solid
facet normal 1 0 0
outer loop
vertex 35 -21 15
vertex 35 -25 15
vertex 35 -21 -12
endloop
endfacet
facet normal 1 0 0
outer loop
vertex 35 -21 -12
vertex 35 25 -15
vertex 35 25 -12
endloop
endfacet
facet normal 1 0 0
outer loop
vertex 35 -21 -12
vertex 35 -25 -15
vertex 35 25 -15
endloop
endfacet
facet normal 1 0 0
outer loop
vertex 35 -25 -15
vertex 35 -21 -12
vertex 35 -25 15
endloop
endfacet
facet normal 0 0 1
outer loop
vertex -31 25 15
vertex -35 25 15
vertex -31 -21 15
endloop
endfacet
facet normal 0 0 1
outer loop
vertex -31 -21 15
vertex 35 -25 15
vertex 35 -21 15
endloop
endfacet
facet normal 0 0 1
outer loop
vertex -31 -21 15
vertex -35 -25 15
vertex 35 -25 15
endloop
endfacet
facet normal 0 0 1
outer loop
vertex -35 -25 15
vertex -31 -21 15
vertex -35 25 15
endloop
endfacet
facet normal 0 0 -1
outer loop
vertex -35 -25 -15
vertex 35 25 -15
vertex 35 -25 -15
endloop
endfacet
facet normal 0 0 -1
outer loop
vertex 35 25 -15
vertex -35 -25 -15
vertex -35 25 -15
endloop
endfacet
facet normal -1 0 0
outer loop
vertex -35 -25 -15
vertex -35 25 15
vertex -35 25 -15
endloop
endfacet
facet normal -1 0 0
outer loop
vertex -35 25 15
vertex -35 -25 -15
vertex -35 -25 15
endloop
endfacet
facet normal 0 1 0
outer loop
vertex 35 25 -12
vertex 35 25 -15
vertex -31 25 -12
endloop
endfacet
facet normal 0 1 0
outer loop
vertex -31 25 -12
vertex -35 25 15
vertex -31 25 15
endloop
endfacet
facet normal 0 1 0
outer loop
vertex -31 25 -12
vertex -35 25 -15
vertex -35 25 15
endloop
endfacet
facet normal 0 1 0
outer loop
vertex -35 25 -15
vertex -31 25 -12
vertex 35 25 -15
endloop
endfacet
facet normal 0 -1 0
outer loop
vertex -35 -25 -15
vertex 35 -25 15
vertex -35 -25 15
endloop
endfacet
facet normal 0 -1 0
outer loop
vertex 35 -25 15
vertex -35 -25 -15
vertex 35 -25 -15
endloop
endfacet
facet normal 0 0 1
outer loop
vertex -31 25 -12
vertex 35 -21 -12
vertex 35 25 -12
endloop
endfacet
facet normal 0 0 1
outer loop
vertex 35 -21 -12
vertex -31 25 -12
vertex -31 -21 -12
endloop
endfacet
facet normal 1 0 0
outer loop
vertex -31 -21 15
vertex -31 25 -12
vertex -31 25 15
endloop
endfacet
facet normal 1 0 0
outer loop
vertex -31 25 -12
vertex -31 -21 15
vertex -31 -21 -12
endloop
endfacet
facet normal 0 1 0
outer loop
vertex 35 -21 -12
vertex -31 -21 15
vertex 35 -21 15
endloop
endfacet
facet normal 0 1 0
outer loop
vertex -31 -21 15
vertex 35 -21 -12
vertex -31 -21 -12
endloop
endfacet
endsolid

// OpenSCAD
$fn = 128; // High resolution for smooth curves and precise fits

// --- Part 1: Box Dimensions ---
// Outer dimensions (X x Y x Z)
BOX_OUT_X = 70;
BOX_OUT_Y = 50;
BOX_OUT_Z = 30;

// Wall and floor thickness
WALL_THICKNESS = 2;
FLOOR_THICKNESS = 2;

// --- Part 2: Lid Dimensions ---
// Plate dimensions (same as box outer footprint)
LID_PLATE_X = 70;
LID_PLATE_Y = 50;
LID_PLATE_Z = 2; // Thickness of the base plate

// Lip dimensions
LIP_WALL_THICKNESS = 1.5;
LIP_HEIGHT = 4; // Height of the lip above the plate

// Lip outer size (calculated to provide 0.2mm clearance inside the 70x50 box)
// Box inner width = 70 - 2*2 = 66. Target clearance = 0.2. Lip width = 66 - 2*0.2 = 65.6
// Box inner depth = 50 - 2*2 = 46. Target clearance = 0.2. Lip depth = 46 - 2*0.2 = 45.6
LIP_OUT_X = 65.6;
LIP_OUT_Y = 45.6;

// --- Assembly Positioning ---
// Gap between parts
GAP = 10;

// Positioning variables
// Box is centred at X=0, Y=0
// Lid is placed on the +X side with a 10mm gap
// Lid X position = (Box X / 2) + GAP + (Lid X / 2)
// Lid Y position = 0 (centred)
LID_X_OFFSET = (BOX_OUT_X / 2) + GAP + (LID_PLATE_X / 2);

module box() {
    // Create the box shell
    // We use a single difference to create the hollow box
    difference() {
        // Outer block
        translate([0, 0, 0])
            cube([BOX_OUT_X, BOX_OUT_Y, BOX_OUT_Z], center = true);
        
        // Inner void (negative space)
        // Inner dimensions:
        // X: 70 - 2*2 = 66
        // Y: 50 - 2*2 = 46
        // Z: 30 - 2 (floor) = 28
        translate([WALL_THICKNESS, WALL_THICKNESS, FLOOR_THICKNESS])
            cube([
                BOX_OUT_X - 2*WALL_THICKNESS,
                BOX_OUT_Y - 2*WALL_THICKNESS,
                BOX_OUT_Z - FLOOR_THICKNESS
            ], center = true);
    }
}

module lid() {
    // The lid consists of a base plate and a lip.
    // We model this as a solid block with the lip extruded, then subtract the hole for the board.
    
    // 1. Create the base plate
    // Dimensions: 70 x 50 x 2
    // The lip sits on top of this plate.
    
    // 2. Create the lip
    // The lip is a wall of thickness 1.5mm and height 4mm.
    // Outer size of lip: 65.6 x 45.6
    // Inner size of lip (hole for board): 65.6 - 2*1.5 = 62.6 x 45.6 - 2*1.5 = 42.6
    
    // We construct the lid by:
    // a) Creating the full solid block (plate + lip volume)
    // b) Subtracting the hole for the electronics board
    
    difference() {
        // --- Solid Geometry Construction ---
        
        // Start with the base plate
        // Dimensions: 70 x 50 x 2
        translate([0, 0, 0])
            cube([LID_PLATE_X, LID_PLATE_Y, LID_PLATE_Z], center = true);
        
        // Add the lip on top
        // Lip is centered on the plate.
        // Lip thickness is 1.5, so it extends 0.75 above and below the top surface of the plate.
        // However, since we are building up, we can just add a block of height (2 + 1.5) = 3.5
        // but we need to ensure the bottom of the lip is flush with the top of the plate.
        // Easier approach: Add a block of height (LID_PLATE_Z + LIP_HEIGHT) centered at Z=0?
        // No, let's keep Z=0 as the bottom of the plate.
        
        // Let's rebuild the solid logic to be cleaner:
        // Union of Plate and Lip.
        
        // Plate: 70 x 50 x 2, centered at Z=1 (bottom at Z=0)
        // Lip: 65.6 x 45.6 x (2 + 1.5), centered at Z=1 (bottom at Z=0)
        // Wait, the prompt says "lip on top of it".
        // So Plate is 2mm thick. Lip is 4mm tall sitting on top.
        // Total height = 6mm.
        
        // Let's define the solid union first.
        union() {
            // Base Plate
            translate([0, 0, 0])
                cube([LID_PLATE_X, LID_PLATE_Y, LID_PLATE_Z], center = true);
            
            // Lip (sitting on top of plate)
            // Lip outer size: 65.6 x 45.6
            // Lip thickness: 1.5
            // Lip height: 4
            // Position: Centered on plate (X,Y), Bottom at Z = LID_PLATE_Z
            translate([0, 0, LID_PLATE_Z])
                cube([LIP_OUT_X, LIP_OUT_Y, LIP_HEIGHT], center = true);
        }
        
        // --- Subtraction: Hole for Board ---
        // The hole must go through the entire thickness (Plate + Lip).
        // Total thickness = 2 + 4 = 6mm.
        // Hole dimensions:
        // X: Lip Outer X - 2 * Lip Wall Thickness = 65.6 - 3 = 62.6
        // Y: Lip Outer Y - 2 * Lip Wall Thickness = 45.6 - 3 = 42.6
        
        translate([0, 0, 0])
            cube([
                LIP_OUT_X - 2*LIP_WALL_THICKNESS,
                LIP_OUT_Y - 2*LIP_WALL_THICKNESS,
                LID_PLATE_Z + LIP_HEIGHT
            ], center = true);
    }
}

// --- Main Assembly ---
// Combine Box and Lid with the specified gap
translate([0, 0, 0])
    box();

translate([LID_X_OFFSET, 0, 0])
    lid();
